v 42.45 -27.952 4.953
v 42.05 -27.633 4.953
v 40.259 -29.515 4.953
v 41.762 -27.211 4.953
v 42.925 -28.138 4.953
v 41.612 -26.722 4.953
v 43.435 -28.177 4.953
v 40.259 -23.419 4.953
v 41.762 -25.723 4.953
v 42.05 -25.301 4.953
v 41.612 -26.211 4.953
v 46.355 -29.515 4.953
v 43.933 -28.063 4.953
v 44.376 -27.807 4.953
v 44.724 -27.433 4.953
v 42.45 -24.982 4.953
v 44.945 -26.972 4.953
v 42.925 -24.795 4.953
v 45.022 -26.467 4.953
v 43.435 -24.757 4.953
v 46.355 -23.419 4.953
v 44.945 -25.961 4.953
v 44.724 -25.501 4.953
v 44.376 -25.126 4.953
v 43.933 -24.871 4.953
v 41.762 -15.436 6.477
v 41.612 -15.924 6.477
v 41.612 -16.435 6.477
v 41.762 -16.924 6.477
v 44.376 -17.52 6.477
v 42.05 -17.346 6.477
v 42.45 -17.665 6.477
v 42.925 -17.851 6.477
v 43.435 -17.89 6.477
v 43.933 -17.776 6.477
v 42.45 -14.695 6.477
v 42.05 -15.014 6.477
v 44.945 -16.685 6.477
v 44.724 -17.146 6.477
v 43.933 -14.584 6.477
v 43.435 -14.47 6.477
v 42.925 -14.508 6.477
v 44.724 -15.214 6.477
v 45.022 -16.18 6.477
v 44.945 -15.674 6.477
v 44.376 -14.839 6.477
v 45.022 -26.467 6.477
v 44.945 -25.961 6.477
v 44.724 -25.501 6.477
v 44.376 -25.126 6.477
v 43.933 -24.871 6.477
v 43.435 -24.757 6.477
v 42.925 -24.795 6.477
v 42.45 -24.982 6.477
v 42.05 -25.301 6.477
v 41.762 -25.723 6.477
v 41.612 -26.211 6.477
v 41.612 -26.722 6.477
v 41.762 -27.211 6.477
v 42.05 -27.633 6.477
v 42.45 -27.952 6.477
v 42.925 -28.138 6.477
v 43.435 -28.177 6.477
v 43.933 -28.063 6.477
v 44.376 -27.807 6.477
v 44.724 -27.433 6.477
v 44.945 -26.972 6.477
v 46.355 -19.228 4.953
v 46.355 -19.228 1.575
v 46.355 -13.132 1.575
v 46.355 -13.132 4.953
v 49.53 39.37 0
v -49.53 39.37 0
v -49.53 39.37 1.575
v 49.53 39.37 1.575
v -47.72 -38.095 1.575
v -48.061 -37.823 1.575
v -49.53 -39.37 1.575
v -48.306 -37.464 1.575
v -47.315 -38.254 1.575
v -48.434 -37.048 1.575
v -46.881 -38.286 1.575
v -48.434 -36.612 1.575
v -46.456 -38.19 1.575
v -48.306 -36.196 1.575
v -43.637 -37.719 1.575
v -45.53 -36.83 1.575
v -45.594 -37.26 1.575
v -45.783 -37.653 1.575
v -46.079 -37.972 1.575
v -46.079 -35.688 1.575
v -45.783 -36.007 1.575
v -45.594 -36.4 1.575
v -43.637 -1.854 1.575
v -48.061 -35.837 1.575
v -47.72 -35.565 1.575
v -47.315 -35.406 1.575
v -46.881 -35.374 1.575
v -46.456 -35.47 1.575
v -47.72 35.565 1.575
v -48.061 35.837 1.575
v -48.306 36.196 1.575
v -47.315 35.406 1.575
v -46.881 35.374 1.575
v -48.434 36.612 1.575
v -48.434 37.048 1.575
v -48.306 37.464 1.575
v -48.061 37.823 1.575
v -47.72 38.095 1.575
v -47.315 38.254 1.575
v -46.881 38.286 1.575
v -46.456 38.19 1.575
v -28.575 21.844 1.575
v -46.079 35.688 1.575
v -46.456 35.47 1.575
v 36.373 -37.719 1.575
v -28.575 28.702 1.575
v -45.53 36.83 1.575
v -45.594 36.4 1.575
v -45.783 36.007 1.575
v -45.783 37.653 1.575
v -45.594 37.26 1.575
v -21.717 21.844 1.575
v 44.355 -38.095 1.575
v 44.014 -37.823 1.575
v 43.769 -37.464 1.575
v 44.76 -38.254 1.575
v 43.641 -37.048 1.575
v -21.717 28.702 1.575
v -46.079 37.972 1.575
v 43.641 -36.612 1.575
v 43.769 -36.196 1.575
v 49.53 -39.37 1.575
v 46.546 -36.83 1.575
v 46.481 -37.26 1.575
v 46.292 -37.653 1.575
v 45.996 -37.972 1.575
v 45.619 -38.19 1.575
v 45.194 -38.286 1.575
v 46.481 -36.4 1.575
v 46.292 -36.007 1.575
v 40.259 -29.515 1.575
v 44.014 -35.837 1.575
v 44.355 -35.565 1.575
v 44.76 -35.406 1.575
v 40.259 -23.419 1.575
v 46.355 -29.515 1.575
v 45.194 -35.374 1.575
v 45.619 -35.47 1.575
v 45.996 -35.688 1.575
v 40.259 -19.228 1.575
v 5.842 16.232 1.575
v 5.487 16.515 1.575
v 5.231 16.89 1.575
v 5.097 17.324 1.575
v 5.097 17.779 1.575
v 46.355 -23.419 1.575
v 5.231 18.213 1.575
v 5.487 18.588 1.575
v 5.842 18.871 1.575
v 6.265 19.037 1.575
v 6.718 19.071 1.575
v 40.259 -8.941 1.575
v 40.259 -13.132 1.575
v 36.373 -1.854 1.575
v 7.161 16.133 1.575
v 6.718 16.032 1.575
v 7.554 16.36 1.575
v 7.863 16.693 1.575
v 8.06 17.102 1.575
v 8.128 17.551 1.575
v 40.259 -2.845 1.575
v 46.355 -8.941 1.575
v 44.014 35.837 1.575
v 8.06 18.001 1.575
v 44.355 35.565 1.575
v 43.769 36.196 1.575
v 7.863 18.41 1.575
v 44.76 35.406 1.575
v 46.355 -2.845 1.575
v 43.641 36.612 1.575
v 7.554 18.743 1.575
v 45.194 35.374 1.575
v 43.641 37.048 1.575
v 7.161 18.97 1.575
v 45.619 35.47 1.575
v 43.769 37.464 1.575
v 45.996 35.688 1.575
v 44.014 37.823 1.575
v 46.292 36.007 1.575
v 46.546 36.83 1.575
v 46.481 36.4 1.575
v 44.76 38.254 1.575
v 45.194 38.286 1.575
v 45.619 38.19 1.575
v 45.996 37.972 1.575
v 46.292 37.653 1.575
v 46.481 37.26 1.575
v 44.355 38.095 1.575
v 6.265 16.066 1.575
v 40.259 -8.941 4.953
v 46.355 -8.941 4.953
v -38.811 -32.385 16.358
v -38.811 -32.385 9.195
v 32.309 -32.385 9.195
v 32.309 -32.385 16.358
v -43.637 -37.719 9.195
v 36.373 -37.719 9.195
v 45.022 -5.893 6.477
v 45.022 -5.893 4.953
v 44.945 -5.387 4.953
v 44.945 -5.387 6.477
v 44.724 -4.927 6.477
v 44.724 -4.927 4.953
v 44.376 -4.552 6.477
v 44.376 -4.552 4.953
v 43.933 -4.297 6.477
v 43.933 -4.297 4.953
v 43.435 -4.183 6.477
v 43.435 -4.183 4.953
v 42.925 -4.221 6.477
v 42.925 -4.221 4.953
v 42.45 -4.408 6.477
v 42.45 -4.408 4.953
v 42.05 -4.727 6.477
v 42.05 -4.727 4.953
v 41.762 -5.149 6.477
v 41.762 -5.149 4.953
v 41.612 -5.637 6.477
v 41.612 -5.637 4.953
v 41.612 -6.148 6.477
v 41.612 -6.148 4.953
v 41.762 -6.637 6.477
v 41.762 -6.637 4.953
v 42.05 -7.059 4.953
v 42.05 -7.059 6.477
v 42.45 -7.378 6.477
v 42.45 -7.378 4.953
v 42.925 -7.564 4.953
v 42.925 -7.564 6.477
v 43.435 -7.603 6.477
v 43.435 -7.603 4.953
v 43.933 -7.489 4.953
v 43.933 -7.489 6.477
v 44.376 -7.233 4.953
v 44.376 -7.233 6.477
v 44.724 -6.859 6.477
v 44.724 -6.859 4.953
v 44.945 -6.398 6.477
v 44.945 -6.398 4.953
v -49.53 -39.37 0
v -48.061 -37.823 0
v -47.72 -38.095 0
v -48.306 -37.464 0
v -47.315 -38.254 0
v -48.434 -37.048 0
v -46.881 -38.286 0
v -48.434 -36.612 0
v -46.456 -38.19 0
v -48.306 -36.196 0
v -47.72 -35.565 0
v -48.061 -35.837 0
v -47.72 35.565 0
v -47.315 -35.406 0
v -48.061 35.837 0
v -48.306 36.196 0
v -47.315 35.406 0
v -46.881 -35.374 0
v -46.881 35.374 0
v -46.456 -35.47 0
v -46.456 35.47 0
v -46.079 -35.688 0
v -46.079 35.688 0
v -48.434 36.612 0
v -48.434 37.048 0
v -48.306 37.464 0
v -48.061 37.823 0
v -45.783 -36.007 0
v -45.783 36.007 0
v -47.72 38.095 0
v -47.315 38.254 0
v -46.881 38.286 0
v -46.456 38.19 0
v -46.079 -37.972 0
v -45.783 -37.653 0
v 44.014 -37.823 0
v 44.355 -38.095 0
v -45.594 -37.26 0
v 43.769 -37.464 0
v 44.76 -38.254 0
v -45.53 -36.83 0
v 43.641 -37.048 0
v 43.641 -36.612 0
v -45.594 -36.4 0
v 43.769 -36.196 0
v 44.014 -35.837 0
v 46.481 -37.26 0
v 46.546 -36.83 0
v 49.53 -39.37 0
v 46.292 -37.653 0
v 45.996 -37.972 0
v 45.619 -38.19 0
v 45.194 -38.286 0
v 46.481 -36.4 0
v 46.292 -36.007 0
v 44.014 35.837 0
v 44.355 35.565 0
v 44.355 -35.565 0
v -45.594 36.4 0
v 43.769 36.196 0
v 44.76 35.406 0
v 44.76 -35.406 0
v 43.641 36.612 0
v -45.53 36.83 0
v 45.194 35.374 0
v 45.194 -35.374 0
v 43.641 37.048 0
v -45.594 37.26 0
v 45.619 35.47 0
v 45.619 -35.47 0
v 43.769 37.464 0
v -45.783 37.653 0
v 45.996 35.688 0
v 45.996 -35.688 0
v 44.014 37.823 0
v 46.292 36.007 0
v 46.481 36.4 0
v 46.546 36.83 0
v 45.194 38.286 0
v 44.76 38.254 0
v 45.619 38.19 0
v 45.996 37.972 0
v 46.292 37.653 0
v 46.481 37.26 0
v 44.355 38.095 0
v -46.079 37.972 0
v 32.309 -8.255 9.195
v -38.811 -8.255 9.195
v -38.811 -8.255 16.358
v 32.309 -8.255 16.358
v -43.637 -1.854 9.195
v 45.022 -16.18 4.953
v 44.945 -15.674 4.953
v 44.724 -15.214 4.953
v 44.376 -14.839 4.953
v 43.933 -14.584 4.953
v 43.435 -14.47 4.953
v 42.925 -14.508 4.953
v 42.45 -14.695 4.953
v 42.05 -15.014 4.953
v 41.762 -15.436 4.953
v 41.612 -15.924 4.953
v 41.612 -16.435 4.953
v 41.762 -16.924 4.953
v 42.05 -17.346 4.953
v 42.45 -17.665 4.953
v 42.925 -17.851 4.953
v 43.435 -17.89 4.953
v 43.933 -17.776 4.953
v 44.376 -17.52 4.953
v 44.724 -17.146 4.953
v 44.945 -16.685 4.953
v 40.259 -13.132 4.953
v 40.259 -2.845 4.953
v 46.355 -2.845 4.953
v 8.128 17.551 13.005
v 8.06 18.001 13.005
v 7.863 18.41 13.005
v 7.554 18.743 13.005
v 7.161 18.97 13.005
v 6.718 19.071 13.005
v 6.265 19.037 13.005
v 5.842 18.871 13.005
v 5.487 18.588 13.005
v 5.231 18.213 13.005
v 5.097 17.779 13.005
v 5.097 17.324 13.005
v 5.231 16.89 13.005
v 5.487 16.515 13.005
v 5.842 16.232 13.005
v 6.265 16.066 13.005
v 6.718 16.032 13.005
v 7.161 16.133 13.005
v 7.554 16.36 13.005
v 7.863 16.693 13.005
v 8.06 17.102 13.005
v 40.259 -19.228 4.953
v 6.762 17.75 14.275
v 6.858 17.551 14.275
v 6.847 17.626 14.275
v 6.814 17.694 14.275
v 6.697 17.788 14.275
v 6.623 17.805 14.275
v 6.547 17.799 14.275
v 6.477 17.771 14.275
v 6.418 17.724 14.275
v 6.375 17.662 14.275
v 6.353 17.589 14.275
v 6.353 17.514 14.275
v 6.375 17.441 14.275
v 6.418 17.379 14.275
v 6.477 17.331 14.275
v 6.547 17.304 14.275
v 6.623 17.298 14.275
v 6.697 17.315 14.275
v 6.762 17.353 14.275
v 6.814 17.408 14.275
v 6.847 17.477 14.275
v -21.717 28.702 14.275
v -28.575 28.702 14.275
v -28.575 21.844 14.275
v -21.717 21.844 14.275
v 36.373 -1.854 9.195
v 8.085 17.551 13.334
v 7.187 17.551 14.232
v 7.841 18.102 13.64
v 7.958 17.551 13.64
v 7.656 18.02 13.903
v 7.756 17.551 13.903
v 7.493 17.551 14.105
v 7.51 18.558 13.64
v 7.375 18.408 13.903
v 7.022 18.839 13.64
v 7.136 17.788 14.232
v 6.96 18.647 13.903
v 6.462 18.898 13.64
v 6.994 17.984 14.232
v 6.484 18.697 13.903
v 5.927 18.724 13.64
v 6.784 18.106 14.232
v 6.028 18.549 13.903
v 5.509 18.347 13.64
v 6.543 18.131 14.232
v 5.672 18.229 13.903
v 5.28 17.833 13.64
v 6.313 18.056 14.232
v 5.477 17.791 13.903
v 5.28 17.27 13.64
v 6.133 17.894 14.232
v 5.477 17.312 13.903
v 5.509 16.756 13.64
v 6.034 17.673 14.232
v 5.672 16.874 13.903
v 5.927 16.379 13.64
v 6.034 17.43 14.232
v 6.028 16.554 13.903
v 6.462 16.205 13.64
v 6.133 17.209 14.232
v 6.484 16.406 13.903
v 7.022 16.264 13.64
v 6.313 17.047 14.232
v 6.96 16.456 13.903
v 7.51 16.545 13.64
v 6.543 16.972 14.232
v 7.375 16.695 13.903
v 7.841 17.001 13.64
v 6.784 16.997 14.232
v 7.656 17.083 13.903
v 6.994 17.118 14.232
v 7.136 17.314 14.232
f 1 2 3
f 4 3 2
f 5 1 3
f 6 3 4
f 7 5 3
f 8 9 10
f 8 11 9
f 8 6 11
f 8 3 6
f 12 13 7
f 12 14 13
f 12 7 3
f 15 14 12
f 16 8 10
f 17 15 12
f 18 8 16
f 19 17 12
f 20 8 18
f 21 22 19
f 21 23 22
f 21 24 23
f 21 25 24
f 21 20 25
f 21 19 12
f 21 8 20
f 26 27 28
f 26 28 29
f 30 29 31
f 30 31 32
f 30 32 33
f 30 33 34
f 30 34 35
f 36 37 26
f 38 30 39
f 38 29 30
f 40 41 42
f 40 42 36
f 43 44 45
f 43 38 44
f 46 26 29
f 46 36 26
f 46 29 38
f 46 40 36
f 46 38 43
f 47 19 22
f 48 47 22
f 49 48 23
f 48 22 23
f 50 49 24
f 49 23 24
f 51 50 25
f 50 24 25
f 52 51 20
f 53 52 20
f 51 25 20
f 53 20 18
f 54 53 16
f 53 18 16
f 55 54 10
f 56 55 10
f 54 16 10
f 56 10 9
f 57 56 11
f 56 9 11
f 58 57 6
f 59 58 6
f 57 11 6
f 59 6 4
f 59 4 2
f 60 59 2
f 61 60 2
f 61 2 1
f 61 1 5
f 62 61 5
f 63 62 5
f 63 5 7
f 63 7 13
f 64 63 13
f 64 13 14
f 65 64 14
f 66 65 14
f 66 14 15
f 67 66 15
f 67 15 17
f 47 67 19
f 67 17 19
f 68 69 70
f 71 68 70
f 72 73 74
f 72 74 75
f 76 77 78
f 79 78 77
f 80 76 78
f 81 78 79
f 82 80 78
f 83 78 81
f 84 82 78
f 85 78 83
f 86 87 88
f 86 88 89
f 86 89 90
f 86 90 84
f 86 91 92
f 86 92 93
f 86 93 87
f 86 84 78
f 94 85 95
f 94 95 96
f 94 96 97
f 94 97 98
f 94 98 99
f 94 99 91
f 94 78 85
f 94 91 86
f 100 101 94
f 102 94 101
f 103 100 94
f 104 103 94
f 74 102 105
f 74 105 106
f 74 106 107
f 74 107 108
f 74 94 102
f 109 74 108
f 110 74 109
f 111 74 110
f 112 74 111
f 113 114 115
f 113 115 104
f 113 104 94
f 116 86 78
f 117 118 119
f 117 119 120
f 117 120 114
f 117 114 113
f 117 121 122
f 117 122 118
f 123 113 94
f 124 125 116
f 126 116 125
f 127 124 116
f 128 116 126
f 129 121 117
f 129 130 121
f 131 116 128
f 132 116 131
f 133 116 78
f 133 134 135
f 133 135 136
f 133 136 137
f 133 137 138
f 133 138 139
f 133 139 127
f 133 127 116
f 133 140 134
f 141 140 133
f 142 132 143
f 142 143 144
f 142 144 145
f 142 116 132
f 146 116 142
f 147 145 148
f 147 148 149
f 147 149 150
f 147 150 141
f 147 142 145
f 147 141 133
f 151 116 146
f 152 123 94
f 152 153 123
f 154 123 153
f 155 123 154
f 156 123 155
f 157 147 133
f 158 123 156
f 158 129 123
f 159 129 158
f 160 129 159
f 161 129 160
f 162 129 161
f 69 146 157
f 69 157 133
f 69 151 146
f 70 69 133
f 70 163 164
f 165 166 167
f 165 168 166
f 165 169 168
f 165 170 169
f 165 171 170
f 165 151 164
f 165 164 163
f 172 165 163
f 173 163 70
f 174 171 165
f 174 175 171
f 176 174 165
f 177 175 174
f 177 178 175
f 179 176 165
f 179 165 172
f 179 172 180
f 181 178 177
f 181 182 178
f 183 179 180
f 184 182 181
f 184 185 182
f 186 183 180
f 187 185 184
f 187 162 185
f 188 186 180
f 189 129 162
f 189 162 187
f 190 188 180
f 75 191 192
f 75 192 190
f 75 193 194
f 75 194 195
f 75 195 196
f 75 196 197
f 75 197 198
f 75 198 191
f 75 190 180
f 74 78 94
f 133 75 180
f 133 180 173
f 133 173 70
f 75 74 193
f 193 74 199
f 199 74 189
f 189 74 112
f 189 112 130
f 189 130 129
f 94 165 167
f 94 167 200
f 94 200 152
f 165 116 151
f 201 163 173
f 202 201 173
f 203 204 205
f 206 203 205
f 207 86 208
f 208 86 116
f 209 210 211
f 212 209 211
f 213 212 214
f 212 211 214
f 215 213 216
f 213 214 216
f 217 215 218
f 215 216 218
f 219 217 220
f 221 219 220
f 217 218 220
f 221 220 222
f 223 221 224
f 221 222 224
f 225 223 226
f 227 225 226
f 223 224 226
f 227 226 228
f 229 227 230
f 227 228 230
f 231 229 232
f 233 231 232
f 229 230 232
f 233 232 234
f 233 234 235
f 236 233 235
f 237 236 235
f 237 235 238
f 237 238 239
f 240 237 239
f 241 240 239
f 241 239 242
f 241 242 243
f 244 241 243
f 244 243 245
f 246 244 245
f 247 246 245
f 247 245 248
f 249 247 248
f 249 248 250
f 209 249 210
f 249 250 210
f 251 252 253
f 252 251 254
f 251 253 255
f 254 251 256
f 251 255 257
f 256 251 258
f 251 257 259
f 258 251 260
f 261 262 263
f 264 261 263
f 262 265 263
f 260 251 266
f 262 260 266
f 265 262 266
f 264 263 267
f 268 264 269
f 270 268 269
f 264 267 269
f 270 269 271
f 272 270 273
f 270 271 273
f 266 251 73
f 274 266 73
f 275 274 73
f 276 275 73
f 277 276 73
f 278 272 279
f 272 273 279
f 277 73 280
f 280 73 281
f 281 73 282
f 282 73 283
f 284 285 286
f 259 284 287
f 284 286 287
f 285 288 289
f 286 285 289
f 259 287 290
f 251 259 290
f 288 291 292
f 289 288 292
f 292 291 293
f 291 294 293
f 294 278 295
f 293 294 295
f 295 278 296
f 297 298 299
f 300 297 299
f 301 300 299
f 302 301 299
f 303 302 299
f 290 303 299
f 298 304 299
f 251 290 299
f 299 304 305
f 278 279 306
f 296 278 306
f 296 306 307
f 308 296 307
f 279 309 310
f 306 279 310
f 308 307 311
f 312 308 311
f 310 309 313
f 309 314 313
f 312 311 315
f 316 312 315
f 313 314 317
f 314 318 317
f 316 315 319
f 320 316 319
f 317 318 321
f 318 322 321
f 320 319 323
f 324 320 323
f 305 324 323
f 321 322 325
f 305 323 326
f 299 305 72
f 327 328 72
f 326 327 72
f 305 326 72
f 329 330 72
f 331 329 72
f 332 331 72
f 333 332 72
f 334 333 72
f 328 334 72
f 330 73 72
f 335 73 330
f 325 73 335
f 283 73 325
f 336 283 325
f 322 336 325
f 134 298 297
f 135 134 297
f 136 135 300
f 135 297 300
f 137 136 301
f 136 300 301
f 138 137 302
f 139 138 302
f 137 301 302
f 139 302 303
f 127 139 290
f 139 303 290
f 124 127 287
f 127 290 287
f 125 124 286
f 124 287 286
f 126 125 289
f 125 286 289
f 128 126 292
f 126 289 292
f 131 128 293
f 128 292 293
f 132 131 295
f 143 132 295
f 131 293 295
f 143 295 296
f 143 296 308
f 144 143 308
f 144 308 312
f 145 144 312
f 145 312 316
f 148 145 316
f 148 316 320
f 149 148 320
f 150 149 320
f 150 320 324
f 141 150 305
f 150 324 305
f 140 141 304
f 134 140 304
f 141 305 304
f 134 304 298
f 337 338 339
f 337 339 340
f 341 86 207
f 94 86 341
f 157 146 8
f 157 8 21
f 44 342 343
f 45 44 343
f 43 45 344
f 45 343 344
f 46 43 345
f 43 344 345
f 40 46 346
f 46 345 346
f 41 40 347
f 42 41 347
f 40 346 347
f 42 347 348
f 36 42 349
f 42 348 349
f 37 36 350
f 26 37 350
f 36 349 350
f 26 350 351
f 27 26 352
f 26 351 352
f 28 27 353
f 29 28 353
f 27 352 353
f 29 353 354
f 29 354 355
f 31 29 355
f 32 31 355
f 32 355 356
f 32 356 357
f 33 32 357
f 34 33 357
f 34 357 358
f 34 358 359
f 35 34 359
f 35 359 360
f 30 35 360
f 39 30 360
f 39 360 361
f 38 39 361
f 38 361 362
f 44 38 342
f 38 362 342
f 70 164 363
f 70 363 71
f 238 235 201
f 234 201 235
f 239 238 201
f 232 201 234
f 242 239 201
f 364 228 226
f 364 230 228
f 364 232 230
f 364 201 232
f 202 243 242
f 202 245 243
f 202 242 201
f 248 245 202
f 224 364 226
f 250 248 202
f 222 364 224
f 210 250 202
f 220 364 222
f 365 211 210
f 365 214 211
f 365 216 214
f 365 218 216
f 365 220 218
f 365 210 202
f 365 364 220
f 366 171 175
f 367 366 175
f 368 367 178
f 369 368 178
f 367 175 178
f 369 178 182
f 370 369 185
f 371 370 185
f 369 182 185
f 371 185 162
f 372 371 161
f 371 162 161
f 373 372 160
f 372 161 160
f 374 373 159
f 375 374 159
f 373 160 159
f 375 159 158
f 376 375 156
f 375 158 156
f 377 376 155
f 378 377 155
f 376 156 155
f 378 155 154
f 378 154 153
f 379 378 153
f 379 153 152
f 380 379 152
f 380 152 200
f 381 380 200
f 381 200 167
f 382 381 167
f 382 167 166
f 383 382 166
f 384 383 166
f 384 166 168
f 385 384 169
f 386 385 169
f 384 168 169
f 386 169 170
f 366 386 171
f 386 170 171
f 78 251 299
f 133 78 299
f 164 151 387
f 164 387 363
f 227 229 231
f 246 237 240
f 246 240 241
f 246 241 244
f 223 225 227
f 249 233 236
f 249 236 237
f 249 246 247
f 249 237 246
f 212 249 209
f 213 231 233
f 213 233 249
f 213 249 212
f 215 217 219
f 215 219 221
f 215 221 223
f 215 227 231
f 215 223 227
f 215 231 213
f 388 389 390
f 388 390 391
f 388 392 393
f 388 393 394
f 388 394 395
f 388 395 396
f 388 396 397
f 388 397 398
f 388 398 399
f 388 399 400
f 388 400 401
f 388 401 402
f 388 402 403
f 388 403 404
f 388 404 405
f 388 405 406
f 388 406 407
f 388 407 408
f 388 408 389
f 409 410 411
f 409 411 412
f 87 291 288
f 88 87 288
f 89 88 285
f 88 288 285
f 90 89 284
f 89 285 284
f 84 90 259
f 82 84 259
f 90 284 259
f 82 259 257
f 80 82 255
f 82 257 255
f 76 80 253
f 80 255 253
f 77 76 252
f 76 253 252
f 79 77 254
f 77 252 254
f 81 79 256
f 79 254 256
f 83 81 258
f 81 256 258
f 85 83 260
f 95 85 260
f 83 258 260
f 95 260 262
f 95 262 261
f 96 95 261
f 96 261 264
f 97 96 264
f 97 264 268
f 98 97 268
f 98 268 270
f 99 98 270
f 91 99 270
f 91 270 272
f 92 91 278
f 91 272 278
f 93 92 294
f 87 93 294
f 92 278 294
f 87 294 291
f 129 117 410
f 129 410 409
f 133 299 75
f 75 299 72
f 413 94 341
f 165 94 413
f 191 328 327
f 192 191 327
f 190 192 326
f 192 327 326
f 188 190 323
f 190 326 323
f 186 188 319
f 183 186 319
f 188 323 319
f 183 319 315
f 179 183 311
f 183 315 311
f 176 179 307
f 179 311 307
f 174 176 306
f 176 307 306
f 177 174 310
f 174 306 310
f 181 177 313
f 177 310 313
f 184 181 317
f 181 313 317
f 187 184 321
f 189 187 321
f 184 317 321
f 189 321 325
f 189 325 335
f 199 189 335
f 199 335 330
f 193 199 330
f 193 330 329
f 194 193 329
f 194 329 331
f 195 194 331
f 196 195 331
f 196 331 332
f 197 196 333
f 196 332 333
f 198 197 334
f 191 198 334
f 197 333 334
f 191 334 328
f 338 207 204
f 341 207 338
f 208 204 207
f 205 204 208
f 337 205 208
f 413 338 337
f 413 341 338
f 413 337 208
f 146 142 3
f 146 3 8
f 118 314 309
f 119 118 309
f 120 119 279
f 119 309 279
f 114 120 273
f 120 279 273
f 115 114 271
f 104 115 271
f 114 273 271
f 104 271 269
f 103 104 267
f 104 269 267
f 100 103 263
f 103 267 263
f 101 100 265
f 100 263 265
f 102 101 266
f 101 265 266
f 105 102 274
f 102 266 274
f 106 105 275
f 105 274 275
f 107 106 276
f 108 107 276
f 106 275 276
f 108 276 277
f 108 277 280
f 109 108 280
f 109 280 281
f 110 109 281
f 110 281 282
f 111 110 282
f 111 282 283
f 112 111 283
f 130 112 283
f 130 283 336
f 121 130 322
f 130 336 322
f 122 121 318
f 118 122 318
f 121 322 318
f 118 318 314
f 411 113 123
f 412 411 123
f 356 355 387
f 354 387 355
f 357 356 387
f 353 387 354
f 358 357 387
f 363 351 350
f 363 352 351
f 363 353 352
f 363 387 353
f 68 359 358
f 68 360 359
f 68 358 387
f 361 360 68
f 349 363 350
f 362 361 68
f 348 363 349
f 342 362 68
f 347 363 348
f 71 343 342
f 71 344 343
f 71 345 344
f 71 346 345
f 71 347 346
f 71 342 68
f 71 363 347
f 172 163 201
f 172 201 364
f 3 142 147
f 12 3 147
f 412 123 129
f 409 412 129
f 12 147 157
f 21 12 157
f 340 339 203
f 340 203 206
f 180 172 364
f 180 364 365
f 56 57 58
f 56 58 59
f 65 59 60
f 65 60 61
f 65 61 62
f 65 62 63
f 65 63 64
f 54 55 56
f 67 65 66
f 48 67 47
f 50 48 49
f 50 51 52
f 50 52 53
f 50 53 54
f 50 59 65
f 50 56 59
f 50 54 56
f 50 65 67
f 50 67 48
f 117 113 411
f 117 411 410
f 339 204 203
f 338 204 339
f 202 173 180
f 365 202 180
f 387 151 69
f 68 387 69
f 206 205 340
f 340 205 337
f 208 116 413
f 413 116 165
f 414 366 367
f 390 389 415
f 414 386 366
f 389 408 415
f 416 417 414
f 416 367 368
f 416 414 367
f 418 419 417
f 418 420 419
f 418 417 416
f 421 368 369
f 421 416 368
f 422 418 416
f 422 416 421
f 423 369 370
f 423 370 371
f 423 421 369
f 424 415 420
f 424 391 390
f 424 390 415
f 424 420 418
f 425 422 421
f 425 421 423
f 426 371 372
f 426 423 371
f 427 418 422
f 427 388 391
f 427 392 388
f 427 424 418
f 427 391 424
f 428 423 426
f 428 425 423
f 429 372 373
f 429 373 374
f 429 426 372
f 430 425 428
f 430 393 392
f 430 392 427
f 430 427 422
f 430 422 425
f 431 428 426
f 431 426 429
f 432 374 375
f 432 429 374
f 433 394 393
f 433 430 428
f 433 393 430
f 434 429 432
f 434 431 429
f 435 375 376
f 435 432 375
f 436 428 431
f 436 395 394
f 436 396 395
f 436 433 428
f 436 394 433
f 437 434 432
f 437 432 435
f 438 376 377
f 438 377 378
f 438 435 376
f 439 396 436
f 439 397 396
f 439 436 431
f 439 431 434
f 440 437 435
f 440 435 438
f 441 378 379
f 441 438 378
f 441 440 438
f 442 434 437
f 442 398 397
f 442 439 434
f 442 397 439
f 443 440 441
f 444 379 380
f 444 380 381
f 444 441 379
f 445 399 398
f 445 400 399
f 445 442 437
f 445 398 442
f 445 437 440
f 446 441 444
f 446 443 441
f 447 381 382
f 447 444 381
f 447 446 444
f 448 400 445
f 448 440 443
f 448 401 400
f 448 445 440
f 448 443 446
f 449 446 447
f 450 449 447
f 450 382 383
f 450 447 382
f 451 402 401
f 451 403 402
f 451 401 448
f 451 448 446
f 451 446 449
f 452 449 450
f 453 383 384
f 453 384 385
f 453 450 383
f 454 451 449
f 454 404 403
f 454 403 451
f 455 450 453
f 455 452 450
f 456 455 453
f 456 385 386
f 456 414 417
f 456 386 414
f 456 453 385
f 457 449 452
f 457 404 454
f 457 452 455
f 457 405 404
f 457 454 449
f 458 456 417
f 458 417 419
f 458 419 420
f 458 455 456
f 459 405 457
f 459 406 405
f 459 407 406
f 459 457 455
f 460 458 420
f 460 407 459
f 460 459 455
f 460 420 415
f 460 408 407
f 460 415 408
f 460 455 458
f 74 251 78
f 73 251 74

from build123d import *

# Parameters (mm, degrees)
F0_W      = 99.06
F0_H      = 78.74
F1_DEPTH  = 1.5748
F2_W      = 80.01
F2_H      = 35.8648
F3_DEPTH  = 7.62
F4_W      = 71.12
F4_H      = 24.13
F5_DEPTH  = 7.1628
F6_W      = 6.096
F6_H      = 6.096
F7_DEPTH  = 3.3782
F8_R      = 1.7145
F9_DEPTH  = 1.524
F10_R     = 1.524
F11_DEPTH = 12.7
F12_R     = 1.27
F13_W     = 6.858
F13_H     = 6.858
F14_DEPTH = 12.7
F15_R     = 1.4605
F16_DEPTH = 1.5748


with BuildPart() as f1:
    # F0 (on Top) → F1 (new body)
    with BuildSketch(Plane.XY):
        Rectangle(F0_W, F0_H)
    extrude(amount=F1_DEPTH)

    # F2 (on face) → F3 (join)
    with BuildSketch(Plane.XY.offset(1.5748)):
        with Locations((-3.6322, -19.7866)):
            Rectangle(F2_W, F2_H)
    extrude(amount=F3_DEPTH)

    # F4 (on face) → F5 (join)
    with BuildSketch(Plane.XY.offset(9.1948)):
        with Locations((-3.2512, -20.32)):
            Rectangle(F4_W, F4_H)
    extrude(amount=F5_DEPTH)

    # F6 (on face) → F7 (join)
    with BuildSketch(Plane.XY.offset(1.5748)):
        with Locations((43.307, -26.4668)):
            Rectangle(F6_W, F6_H)
        with Locations((43.307, -16.1798)):
            Rectangle(F6_W, F6_H)
        with Locations((43.307, -5.8928)):
            Rectangle(F6_W, F6_H)
    extrude(amount=F7_DEPTH)

    # F8 (on face) → F9 (join)
    with BuildSketch(Plane.XY.offset(4.953)):
        with Locations((43.307, -5.8928)):
            Circle(F8_R)
        with Locations((43.307, -16.1798)):
            Circle(F8_R)
        with Locations((43.307, -26.4668)):
            Circle(F8_R)
    extrude(amount=F9_DEPTH)

    # F10 (on face) → F11 (join)
    with BuildSketch(Plane.XY.offset(1.5748)):
        with Locations((6.604, 17.5514)):
            Circle(F10_R)
    extrude(amount=F11_DEPTH)

    # F12
    f12_edges = [f1.edges().sort_by_distance(p)[0] for p in [
        (5.08, 17.5514, 14.2748),
    ]]
    fillet(f12_edges, radius=F12_R)

    # F13 (on face) → F14 (join)
    with BuildSketch(Plane.XY.offset(1.5748)):
        with Locations((-25.146, 25.273)):
            Rectangle(F13_W, F13_H)
    extrude(amount=F14_DEPTH)

    # F15 (on face) → F16 (cut, through all)
    with BuildSketch(Plane(origin=(0, 0, 0), x_dir=(1, 0, 0), z_dir=(0, 0, -1))):
        with Locations((-46.99, 36.83)):
            Circle(F15_R)
        with Locations((45.085, 36.83)):
            Circle(F15_R)
        with Locations((45.085, -36.83)):
            Circle(F15_R)
        with Locations((-46.99, -36.83)):
            Circle(F15_R)
    extrude(amount=-F16_DEPTH, mode=Mode.SUBTRACT)


solid = f1.part
